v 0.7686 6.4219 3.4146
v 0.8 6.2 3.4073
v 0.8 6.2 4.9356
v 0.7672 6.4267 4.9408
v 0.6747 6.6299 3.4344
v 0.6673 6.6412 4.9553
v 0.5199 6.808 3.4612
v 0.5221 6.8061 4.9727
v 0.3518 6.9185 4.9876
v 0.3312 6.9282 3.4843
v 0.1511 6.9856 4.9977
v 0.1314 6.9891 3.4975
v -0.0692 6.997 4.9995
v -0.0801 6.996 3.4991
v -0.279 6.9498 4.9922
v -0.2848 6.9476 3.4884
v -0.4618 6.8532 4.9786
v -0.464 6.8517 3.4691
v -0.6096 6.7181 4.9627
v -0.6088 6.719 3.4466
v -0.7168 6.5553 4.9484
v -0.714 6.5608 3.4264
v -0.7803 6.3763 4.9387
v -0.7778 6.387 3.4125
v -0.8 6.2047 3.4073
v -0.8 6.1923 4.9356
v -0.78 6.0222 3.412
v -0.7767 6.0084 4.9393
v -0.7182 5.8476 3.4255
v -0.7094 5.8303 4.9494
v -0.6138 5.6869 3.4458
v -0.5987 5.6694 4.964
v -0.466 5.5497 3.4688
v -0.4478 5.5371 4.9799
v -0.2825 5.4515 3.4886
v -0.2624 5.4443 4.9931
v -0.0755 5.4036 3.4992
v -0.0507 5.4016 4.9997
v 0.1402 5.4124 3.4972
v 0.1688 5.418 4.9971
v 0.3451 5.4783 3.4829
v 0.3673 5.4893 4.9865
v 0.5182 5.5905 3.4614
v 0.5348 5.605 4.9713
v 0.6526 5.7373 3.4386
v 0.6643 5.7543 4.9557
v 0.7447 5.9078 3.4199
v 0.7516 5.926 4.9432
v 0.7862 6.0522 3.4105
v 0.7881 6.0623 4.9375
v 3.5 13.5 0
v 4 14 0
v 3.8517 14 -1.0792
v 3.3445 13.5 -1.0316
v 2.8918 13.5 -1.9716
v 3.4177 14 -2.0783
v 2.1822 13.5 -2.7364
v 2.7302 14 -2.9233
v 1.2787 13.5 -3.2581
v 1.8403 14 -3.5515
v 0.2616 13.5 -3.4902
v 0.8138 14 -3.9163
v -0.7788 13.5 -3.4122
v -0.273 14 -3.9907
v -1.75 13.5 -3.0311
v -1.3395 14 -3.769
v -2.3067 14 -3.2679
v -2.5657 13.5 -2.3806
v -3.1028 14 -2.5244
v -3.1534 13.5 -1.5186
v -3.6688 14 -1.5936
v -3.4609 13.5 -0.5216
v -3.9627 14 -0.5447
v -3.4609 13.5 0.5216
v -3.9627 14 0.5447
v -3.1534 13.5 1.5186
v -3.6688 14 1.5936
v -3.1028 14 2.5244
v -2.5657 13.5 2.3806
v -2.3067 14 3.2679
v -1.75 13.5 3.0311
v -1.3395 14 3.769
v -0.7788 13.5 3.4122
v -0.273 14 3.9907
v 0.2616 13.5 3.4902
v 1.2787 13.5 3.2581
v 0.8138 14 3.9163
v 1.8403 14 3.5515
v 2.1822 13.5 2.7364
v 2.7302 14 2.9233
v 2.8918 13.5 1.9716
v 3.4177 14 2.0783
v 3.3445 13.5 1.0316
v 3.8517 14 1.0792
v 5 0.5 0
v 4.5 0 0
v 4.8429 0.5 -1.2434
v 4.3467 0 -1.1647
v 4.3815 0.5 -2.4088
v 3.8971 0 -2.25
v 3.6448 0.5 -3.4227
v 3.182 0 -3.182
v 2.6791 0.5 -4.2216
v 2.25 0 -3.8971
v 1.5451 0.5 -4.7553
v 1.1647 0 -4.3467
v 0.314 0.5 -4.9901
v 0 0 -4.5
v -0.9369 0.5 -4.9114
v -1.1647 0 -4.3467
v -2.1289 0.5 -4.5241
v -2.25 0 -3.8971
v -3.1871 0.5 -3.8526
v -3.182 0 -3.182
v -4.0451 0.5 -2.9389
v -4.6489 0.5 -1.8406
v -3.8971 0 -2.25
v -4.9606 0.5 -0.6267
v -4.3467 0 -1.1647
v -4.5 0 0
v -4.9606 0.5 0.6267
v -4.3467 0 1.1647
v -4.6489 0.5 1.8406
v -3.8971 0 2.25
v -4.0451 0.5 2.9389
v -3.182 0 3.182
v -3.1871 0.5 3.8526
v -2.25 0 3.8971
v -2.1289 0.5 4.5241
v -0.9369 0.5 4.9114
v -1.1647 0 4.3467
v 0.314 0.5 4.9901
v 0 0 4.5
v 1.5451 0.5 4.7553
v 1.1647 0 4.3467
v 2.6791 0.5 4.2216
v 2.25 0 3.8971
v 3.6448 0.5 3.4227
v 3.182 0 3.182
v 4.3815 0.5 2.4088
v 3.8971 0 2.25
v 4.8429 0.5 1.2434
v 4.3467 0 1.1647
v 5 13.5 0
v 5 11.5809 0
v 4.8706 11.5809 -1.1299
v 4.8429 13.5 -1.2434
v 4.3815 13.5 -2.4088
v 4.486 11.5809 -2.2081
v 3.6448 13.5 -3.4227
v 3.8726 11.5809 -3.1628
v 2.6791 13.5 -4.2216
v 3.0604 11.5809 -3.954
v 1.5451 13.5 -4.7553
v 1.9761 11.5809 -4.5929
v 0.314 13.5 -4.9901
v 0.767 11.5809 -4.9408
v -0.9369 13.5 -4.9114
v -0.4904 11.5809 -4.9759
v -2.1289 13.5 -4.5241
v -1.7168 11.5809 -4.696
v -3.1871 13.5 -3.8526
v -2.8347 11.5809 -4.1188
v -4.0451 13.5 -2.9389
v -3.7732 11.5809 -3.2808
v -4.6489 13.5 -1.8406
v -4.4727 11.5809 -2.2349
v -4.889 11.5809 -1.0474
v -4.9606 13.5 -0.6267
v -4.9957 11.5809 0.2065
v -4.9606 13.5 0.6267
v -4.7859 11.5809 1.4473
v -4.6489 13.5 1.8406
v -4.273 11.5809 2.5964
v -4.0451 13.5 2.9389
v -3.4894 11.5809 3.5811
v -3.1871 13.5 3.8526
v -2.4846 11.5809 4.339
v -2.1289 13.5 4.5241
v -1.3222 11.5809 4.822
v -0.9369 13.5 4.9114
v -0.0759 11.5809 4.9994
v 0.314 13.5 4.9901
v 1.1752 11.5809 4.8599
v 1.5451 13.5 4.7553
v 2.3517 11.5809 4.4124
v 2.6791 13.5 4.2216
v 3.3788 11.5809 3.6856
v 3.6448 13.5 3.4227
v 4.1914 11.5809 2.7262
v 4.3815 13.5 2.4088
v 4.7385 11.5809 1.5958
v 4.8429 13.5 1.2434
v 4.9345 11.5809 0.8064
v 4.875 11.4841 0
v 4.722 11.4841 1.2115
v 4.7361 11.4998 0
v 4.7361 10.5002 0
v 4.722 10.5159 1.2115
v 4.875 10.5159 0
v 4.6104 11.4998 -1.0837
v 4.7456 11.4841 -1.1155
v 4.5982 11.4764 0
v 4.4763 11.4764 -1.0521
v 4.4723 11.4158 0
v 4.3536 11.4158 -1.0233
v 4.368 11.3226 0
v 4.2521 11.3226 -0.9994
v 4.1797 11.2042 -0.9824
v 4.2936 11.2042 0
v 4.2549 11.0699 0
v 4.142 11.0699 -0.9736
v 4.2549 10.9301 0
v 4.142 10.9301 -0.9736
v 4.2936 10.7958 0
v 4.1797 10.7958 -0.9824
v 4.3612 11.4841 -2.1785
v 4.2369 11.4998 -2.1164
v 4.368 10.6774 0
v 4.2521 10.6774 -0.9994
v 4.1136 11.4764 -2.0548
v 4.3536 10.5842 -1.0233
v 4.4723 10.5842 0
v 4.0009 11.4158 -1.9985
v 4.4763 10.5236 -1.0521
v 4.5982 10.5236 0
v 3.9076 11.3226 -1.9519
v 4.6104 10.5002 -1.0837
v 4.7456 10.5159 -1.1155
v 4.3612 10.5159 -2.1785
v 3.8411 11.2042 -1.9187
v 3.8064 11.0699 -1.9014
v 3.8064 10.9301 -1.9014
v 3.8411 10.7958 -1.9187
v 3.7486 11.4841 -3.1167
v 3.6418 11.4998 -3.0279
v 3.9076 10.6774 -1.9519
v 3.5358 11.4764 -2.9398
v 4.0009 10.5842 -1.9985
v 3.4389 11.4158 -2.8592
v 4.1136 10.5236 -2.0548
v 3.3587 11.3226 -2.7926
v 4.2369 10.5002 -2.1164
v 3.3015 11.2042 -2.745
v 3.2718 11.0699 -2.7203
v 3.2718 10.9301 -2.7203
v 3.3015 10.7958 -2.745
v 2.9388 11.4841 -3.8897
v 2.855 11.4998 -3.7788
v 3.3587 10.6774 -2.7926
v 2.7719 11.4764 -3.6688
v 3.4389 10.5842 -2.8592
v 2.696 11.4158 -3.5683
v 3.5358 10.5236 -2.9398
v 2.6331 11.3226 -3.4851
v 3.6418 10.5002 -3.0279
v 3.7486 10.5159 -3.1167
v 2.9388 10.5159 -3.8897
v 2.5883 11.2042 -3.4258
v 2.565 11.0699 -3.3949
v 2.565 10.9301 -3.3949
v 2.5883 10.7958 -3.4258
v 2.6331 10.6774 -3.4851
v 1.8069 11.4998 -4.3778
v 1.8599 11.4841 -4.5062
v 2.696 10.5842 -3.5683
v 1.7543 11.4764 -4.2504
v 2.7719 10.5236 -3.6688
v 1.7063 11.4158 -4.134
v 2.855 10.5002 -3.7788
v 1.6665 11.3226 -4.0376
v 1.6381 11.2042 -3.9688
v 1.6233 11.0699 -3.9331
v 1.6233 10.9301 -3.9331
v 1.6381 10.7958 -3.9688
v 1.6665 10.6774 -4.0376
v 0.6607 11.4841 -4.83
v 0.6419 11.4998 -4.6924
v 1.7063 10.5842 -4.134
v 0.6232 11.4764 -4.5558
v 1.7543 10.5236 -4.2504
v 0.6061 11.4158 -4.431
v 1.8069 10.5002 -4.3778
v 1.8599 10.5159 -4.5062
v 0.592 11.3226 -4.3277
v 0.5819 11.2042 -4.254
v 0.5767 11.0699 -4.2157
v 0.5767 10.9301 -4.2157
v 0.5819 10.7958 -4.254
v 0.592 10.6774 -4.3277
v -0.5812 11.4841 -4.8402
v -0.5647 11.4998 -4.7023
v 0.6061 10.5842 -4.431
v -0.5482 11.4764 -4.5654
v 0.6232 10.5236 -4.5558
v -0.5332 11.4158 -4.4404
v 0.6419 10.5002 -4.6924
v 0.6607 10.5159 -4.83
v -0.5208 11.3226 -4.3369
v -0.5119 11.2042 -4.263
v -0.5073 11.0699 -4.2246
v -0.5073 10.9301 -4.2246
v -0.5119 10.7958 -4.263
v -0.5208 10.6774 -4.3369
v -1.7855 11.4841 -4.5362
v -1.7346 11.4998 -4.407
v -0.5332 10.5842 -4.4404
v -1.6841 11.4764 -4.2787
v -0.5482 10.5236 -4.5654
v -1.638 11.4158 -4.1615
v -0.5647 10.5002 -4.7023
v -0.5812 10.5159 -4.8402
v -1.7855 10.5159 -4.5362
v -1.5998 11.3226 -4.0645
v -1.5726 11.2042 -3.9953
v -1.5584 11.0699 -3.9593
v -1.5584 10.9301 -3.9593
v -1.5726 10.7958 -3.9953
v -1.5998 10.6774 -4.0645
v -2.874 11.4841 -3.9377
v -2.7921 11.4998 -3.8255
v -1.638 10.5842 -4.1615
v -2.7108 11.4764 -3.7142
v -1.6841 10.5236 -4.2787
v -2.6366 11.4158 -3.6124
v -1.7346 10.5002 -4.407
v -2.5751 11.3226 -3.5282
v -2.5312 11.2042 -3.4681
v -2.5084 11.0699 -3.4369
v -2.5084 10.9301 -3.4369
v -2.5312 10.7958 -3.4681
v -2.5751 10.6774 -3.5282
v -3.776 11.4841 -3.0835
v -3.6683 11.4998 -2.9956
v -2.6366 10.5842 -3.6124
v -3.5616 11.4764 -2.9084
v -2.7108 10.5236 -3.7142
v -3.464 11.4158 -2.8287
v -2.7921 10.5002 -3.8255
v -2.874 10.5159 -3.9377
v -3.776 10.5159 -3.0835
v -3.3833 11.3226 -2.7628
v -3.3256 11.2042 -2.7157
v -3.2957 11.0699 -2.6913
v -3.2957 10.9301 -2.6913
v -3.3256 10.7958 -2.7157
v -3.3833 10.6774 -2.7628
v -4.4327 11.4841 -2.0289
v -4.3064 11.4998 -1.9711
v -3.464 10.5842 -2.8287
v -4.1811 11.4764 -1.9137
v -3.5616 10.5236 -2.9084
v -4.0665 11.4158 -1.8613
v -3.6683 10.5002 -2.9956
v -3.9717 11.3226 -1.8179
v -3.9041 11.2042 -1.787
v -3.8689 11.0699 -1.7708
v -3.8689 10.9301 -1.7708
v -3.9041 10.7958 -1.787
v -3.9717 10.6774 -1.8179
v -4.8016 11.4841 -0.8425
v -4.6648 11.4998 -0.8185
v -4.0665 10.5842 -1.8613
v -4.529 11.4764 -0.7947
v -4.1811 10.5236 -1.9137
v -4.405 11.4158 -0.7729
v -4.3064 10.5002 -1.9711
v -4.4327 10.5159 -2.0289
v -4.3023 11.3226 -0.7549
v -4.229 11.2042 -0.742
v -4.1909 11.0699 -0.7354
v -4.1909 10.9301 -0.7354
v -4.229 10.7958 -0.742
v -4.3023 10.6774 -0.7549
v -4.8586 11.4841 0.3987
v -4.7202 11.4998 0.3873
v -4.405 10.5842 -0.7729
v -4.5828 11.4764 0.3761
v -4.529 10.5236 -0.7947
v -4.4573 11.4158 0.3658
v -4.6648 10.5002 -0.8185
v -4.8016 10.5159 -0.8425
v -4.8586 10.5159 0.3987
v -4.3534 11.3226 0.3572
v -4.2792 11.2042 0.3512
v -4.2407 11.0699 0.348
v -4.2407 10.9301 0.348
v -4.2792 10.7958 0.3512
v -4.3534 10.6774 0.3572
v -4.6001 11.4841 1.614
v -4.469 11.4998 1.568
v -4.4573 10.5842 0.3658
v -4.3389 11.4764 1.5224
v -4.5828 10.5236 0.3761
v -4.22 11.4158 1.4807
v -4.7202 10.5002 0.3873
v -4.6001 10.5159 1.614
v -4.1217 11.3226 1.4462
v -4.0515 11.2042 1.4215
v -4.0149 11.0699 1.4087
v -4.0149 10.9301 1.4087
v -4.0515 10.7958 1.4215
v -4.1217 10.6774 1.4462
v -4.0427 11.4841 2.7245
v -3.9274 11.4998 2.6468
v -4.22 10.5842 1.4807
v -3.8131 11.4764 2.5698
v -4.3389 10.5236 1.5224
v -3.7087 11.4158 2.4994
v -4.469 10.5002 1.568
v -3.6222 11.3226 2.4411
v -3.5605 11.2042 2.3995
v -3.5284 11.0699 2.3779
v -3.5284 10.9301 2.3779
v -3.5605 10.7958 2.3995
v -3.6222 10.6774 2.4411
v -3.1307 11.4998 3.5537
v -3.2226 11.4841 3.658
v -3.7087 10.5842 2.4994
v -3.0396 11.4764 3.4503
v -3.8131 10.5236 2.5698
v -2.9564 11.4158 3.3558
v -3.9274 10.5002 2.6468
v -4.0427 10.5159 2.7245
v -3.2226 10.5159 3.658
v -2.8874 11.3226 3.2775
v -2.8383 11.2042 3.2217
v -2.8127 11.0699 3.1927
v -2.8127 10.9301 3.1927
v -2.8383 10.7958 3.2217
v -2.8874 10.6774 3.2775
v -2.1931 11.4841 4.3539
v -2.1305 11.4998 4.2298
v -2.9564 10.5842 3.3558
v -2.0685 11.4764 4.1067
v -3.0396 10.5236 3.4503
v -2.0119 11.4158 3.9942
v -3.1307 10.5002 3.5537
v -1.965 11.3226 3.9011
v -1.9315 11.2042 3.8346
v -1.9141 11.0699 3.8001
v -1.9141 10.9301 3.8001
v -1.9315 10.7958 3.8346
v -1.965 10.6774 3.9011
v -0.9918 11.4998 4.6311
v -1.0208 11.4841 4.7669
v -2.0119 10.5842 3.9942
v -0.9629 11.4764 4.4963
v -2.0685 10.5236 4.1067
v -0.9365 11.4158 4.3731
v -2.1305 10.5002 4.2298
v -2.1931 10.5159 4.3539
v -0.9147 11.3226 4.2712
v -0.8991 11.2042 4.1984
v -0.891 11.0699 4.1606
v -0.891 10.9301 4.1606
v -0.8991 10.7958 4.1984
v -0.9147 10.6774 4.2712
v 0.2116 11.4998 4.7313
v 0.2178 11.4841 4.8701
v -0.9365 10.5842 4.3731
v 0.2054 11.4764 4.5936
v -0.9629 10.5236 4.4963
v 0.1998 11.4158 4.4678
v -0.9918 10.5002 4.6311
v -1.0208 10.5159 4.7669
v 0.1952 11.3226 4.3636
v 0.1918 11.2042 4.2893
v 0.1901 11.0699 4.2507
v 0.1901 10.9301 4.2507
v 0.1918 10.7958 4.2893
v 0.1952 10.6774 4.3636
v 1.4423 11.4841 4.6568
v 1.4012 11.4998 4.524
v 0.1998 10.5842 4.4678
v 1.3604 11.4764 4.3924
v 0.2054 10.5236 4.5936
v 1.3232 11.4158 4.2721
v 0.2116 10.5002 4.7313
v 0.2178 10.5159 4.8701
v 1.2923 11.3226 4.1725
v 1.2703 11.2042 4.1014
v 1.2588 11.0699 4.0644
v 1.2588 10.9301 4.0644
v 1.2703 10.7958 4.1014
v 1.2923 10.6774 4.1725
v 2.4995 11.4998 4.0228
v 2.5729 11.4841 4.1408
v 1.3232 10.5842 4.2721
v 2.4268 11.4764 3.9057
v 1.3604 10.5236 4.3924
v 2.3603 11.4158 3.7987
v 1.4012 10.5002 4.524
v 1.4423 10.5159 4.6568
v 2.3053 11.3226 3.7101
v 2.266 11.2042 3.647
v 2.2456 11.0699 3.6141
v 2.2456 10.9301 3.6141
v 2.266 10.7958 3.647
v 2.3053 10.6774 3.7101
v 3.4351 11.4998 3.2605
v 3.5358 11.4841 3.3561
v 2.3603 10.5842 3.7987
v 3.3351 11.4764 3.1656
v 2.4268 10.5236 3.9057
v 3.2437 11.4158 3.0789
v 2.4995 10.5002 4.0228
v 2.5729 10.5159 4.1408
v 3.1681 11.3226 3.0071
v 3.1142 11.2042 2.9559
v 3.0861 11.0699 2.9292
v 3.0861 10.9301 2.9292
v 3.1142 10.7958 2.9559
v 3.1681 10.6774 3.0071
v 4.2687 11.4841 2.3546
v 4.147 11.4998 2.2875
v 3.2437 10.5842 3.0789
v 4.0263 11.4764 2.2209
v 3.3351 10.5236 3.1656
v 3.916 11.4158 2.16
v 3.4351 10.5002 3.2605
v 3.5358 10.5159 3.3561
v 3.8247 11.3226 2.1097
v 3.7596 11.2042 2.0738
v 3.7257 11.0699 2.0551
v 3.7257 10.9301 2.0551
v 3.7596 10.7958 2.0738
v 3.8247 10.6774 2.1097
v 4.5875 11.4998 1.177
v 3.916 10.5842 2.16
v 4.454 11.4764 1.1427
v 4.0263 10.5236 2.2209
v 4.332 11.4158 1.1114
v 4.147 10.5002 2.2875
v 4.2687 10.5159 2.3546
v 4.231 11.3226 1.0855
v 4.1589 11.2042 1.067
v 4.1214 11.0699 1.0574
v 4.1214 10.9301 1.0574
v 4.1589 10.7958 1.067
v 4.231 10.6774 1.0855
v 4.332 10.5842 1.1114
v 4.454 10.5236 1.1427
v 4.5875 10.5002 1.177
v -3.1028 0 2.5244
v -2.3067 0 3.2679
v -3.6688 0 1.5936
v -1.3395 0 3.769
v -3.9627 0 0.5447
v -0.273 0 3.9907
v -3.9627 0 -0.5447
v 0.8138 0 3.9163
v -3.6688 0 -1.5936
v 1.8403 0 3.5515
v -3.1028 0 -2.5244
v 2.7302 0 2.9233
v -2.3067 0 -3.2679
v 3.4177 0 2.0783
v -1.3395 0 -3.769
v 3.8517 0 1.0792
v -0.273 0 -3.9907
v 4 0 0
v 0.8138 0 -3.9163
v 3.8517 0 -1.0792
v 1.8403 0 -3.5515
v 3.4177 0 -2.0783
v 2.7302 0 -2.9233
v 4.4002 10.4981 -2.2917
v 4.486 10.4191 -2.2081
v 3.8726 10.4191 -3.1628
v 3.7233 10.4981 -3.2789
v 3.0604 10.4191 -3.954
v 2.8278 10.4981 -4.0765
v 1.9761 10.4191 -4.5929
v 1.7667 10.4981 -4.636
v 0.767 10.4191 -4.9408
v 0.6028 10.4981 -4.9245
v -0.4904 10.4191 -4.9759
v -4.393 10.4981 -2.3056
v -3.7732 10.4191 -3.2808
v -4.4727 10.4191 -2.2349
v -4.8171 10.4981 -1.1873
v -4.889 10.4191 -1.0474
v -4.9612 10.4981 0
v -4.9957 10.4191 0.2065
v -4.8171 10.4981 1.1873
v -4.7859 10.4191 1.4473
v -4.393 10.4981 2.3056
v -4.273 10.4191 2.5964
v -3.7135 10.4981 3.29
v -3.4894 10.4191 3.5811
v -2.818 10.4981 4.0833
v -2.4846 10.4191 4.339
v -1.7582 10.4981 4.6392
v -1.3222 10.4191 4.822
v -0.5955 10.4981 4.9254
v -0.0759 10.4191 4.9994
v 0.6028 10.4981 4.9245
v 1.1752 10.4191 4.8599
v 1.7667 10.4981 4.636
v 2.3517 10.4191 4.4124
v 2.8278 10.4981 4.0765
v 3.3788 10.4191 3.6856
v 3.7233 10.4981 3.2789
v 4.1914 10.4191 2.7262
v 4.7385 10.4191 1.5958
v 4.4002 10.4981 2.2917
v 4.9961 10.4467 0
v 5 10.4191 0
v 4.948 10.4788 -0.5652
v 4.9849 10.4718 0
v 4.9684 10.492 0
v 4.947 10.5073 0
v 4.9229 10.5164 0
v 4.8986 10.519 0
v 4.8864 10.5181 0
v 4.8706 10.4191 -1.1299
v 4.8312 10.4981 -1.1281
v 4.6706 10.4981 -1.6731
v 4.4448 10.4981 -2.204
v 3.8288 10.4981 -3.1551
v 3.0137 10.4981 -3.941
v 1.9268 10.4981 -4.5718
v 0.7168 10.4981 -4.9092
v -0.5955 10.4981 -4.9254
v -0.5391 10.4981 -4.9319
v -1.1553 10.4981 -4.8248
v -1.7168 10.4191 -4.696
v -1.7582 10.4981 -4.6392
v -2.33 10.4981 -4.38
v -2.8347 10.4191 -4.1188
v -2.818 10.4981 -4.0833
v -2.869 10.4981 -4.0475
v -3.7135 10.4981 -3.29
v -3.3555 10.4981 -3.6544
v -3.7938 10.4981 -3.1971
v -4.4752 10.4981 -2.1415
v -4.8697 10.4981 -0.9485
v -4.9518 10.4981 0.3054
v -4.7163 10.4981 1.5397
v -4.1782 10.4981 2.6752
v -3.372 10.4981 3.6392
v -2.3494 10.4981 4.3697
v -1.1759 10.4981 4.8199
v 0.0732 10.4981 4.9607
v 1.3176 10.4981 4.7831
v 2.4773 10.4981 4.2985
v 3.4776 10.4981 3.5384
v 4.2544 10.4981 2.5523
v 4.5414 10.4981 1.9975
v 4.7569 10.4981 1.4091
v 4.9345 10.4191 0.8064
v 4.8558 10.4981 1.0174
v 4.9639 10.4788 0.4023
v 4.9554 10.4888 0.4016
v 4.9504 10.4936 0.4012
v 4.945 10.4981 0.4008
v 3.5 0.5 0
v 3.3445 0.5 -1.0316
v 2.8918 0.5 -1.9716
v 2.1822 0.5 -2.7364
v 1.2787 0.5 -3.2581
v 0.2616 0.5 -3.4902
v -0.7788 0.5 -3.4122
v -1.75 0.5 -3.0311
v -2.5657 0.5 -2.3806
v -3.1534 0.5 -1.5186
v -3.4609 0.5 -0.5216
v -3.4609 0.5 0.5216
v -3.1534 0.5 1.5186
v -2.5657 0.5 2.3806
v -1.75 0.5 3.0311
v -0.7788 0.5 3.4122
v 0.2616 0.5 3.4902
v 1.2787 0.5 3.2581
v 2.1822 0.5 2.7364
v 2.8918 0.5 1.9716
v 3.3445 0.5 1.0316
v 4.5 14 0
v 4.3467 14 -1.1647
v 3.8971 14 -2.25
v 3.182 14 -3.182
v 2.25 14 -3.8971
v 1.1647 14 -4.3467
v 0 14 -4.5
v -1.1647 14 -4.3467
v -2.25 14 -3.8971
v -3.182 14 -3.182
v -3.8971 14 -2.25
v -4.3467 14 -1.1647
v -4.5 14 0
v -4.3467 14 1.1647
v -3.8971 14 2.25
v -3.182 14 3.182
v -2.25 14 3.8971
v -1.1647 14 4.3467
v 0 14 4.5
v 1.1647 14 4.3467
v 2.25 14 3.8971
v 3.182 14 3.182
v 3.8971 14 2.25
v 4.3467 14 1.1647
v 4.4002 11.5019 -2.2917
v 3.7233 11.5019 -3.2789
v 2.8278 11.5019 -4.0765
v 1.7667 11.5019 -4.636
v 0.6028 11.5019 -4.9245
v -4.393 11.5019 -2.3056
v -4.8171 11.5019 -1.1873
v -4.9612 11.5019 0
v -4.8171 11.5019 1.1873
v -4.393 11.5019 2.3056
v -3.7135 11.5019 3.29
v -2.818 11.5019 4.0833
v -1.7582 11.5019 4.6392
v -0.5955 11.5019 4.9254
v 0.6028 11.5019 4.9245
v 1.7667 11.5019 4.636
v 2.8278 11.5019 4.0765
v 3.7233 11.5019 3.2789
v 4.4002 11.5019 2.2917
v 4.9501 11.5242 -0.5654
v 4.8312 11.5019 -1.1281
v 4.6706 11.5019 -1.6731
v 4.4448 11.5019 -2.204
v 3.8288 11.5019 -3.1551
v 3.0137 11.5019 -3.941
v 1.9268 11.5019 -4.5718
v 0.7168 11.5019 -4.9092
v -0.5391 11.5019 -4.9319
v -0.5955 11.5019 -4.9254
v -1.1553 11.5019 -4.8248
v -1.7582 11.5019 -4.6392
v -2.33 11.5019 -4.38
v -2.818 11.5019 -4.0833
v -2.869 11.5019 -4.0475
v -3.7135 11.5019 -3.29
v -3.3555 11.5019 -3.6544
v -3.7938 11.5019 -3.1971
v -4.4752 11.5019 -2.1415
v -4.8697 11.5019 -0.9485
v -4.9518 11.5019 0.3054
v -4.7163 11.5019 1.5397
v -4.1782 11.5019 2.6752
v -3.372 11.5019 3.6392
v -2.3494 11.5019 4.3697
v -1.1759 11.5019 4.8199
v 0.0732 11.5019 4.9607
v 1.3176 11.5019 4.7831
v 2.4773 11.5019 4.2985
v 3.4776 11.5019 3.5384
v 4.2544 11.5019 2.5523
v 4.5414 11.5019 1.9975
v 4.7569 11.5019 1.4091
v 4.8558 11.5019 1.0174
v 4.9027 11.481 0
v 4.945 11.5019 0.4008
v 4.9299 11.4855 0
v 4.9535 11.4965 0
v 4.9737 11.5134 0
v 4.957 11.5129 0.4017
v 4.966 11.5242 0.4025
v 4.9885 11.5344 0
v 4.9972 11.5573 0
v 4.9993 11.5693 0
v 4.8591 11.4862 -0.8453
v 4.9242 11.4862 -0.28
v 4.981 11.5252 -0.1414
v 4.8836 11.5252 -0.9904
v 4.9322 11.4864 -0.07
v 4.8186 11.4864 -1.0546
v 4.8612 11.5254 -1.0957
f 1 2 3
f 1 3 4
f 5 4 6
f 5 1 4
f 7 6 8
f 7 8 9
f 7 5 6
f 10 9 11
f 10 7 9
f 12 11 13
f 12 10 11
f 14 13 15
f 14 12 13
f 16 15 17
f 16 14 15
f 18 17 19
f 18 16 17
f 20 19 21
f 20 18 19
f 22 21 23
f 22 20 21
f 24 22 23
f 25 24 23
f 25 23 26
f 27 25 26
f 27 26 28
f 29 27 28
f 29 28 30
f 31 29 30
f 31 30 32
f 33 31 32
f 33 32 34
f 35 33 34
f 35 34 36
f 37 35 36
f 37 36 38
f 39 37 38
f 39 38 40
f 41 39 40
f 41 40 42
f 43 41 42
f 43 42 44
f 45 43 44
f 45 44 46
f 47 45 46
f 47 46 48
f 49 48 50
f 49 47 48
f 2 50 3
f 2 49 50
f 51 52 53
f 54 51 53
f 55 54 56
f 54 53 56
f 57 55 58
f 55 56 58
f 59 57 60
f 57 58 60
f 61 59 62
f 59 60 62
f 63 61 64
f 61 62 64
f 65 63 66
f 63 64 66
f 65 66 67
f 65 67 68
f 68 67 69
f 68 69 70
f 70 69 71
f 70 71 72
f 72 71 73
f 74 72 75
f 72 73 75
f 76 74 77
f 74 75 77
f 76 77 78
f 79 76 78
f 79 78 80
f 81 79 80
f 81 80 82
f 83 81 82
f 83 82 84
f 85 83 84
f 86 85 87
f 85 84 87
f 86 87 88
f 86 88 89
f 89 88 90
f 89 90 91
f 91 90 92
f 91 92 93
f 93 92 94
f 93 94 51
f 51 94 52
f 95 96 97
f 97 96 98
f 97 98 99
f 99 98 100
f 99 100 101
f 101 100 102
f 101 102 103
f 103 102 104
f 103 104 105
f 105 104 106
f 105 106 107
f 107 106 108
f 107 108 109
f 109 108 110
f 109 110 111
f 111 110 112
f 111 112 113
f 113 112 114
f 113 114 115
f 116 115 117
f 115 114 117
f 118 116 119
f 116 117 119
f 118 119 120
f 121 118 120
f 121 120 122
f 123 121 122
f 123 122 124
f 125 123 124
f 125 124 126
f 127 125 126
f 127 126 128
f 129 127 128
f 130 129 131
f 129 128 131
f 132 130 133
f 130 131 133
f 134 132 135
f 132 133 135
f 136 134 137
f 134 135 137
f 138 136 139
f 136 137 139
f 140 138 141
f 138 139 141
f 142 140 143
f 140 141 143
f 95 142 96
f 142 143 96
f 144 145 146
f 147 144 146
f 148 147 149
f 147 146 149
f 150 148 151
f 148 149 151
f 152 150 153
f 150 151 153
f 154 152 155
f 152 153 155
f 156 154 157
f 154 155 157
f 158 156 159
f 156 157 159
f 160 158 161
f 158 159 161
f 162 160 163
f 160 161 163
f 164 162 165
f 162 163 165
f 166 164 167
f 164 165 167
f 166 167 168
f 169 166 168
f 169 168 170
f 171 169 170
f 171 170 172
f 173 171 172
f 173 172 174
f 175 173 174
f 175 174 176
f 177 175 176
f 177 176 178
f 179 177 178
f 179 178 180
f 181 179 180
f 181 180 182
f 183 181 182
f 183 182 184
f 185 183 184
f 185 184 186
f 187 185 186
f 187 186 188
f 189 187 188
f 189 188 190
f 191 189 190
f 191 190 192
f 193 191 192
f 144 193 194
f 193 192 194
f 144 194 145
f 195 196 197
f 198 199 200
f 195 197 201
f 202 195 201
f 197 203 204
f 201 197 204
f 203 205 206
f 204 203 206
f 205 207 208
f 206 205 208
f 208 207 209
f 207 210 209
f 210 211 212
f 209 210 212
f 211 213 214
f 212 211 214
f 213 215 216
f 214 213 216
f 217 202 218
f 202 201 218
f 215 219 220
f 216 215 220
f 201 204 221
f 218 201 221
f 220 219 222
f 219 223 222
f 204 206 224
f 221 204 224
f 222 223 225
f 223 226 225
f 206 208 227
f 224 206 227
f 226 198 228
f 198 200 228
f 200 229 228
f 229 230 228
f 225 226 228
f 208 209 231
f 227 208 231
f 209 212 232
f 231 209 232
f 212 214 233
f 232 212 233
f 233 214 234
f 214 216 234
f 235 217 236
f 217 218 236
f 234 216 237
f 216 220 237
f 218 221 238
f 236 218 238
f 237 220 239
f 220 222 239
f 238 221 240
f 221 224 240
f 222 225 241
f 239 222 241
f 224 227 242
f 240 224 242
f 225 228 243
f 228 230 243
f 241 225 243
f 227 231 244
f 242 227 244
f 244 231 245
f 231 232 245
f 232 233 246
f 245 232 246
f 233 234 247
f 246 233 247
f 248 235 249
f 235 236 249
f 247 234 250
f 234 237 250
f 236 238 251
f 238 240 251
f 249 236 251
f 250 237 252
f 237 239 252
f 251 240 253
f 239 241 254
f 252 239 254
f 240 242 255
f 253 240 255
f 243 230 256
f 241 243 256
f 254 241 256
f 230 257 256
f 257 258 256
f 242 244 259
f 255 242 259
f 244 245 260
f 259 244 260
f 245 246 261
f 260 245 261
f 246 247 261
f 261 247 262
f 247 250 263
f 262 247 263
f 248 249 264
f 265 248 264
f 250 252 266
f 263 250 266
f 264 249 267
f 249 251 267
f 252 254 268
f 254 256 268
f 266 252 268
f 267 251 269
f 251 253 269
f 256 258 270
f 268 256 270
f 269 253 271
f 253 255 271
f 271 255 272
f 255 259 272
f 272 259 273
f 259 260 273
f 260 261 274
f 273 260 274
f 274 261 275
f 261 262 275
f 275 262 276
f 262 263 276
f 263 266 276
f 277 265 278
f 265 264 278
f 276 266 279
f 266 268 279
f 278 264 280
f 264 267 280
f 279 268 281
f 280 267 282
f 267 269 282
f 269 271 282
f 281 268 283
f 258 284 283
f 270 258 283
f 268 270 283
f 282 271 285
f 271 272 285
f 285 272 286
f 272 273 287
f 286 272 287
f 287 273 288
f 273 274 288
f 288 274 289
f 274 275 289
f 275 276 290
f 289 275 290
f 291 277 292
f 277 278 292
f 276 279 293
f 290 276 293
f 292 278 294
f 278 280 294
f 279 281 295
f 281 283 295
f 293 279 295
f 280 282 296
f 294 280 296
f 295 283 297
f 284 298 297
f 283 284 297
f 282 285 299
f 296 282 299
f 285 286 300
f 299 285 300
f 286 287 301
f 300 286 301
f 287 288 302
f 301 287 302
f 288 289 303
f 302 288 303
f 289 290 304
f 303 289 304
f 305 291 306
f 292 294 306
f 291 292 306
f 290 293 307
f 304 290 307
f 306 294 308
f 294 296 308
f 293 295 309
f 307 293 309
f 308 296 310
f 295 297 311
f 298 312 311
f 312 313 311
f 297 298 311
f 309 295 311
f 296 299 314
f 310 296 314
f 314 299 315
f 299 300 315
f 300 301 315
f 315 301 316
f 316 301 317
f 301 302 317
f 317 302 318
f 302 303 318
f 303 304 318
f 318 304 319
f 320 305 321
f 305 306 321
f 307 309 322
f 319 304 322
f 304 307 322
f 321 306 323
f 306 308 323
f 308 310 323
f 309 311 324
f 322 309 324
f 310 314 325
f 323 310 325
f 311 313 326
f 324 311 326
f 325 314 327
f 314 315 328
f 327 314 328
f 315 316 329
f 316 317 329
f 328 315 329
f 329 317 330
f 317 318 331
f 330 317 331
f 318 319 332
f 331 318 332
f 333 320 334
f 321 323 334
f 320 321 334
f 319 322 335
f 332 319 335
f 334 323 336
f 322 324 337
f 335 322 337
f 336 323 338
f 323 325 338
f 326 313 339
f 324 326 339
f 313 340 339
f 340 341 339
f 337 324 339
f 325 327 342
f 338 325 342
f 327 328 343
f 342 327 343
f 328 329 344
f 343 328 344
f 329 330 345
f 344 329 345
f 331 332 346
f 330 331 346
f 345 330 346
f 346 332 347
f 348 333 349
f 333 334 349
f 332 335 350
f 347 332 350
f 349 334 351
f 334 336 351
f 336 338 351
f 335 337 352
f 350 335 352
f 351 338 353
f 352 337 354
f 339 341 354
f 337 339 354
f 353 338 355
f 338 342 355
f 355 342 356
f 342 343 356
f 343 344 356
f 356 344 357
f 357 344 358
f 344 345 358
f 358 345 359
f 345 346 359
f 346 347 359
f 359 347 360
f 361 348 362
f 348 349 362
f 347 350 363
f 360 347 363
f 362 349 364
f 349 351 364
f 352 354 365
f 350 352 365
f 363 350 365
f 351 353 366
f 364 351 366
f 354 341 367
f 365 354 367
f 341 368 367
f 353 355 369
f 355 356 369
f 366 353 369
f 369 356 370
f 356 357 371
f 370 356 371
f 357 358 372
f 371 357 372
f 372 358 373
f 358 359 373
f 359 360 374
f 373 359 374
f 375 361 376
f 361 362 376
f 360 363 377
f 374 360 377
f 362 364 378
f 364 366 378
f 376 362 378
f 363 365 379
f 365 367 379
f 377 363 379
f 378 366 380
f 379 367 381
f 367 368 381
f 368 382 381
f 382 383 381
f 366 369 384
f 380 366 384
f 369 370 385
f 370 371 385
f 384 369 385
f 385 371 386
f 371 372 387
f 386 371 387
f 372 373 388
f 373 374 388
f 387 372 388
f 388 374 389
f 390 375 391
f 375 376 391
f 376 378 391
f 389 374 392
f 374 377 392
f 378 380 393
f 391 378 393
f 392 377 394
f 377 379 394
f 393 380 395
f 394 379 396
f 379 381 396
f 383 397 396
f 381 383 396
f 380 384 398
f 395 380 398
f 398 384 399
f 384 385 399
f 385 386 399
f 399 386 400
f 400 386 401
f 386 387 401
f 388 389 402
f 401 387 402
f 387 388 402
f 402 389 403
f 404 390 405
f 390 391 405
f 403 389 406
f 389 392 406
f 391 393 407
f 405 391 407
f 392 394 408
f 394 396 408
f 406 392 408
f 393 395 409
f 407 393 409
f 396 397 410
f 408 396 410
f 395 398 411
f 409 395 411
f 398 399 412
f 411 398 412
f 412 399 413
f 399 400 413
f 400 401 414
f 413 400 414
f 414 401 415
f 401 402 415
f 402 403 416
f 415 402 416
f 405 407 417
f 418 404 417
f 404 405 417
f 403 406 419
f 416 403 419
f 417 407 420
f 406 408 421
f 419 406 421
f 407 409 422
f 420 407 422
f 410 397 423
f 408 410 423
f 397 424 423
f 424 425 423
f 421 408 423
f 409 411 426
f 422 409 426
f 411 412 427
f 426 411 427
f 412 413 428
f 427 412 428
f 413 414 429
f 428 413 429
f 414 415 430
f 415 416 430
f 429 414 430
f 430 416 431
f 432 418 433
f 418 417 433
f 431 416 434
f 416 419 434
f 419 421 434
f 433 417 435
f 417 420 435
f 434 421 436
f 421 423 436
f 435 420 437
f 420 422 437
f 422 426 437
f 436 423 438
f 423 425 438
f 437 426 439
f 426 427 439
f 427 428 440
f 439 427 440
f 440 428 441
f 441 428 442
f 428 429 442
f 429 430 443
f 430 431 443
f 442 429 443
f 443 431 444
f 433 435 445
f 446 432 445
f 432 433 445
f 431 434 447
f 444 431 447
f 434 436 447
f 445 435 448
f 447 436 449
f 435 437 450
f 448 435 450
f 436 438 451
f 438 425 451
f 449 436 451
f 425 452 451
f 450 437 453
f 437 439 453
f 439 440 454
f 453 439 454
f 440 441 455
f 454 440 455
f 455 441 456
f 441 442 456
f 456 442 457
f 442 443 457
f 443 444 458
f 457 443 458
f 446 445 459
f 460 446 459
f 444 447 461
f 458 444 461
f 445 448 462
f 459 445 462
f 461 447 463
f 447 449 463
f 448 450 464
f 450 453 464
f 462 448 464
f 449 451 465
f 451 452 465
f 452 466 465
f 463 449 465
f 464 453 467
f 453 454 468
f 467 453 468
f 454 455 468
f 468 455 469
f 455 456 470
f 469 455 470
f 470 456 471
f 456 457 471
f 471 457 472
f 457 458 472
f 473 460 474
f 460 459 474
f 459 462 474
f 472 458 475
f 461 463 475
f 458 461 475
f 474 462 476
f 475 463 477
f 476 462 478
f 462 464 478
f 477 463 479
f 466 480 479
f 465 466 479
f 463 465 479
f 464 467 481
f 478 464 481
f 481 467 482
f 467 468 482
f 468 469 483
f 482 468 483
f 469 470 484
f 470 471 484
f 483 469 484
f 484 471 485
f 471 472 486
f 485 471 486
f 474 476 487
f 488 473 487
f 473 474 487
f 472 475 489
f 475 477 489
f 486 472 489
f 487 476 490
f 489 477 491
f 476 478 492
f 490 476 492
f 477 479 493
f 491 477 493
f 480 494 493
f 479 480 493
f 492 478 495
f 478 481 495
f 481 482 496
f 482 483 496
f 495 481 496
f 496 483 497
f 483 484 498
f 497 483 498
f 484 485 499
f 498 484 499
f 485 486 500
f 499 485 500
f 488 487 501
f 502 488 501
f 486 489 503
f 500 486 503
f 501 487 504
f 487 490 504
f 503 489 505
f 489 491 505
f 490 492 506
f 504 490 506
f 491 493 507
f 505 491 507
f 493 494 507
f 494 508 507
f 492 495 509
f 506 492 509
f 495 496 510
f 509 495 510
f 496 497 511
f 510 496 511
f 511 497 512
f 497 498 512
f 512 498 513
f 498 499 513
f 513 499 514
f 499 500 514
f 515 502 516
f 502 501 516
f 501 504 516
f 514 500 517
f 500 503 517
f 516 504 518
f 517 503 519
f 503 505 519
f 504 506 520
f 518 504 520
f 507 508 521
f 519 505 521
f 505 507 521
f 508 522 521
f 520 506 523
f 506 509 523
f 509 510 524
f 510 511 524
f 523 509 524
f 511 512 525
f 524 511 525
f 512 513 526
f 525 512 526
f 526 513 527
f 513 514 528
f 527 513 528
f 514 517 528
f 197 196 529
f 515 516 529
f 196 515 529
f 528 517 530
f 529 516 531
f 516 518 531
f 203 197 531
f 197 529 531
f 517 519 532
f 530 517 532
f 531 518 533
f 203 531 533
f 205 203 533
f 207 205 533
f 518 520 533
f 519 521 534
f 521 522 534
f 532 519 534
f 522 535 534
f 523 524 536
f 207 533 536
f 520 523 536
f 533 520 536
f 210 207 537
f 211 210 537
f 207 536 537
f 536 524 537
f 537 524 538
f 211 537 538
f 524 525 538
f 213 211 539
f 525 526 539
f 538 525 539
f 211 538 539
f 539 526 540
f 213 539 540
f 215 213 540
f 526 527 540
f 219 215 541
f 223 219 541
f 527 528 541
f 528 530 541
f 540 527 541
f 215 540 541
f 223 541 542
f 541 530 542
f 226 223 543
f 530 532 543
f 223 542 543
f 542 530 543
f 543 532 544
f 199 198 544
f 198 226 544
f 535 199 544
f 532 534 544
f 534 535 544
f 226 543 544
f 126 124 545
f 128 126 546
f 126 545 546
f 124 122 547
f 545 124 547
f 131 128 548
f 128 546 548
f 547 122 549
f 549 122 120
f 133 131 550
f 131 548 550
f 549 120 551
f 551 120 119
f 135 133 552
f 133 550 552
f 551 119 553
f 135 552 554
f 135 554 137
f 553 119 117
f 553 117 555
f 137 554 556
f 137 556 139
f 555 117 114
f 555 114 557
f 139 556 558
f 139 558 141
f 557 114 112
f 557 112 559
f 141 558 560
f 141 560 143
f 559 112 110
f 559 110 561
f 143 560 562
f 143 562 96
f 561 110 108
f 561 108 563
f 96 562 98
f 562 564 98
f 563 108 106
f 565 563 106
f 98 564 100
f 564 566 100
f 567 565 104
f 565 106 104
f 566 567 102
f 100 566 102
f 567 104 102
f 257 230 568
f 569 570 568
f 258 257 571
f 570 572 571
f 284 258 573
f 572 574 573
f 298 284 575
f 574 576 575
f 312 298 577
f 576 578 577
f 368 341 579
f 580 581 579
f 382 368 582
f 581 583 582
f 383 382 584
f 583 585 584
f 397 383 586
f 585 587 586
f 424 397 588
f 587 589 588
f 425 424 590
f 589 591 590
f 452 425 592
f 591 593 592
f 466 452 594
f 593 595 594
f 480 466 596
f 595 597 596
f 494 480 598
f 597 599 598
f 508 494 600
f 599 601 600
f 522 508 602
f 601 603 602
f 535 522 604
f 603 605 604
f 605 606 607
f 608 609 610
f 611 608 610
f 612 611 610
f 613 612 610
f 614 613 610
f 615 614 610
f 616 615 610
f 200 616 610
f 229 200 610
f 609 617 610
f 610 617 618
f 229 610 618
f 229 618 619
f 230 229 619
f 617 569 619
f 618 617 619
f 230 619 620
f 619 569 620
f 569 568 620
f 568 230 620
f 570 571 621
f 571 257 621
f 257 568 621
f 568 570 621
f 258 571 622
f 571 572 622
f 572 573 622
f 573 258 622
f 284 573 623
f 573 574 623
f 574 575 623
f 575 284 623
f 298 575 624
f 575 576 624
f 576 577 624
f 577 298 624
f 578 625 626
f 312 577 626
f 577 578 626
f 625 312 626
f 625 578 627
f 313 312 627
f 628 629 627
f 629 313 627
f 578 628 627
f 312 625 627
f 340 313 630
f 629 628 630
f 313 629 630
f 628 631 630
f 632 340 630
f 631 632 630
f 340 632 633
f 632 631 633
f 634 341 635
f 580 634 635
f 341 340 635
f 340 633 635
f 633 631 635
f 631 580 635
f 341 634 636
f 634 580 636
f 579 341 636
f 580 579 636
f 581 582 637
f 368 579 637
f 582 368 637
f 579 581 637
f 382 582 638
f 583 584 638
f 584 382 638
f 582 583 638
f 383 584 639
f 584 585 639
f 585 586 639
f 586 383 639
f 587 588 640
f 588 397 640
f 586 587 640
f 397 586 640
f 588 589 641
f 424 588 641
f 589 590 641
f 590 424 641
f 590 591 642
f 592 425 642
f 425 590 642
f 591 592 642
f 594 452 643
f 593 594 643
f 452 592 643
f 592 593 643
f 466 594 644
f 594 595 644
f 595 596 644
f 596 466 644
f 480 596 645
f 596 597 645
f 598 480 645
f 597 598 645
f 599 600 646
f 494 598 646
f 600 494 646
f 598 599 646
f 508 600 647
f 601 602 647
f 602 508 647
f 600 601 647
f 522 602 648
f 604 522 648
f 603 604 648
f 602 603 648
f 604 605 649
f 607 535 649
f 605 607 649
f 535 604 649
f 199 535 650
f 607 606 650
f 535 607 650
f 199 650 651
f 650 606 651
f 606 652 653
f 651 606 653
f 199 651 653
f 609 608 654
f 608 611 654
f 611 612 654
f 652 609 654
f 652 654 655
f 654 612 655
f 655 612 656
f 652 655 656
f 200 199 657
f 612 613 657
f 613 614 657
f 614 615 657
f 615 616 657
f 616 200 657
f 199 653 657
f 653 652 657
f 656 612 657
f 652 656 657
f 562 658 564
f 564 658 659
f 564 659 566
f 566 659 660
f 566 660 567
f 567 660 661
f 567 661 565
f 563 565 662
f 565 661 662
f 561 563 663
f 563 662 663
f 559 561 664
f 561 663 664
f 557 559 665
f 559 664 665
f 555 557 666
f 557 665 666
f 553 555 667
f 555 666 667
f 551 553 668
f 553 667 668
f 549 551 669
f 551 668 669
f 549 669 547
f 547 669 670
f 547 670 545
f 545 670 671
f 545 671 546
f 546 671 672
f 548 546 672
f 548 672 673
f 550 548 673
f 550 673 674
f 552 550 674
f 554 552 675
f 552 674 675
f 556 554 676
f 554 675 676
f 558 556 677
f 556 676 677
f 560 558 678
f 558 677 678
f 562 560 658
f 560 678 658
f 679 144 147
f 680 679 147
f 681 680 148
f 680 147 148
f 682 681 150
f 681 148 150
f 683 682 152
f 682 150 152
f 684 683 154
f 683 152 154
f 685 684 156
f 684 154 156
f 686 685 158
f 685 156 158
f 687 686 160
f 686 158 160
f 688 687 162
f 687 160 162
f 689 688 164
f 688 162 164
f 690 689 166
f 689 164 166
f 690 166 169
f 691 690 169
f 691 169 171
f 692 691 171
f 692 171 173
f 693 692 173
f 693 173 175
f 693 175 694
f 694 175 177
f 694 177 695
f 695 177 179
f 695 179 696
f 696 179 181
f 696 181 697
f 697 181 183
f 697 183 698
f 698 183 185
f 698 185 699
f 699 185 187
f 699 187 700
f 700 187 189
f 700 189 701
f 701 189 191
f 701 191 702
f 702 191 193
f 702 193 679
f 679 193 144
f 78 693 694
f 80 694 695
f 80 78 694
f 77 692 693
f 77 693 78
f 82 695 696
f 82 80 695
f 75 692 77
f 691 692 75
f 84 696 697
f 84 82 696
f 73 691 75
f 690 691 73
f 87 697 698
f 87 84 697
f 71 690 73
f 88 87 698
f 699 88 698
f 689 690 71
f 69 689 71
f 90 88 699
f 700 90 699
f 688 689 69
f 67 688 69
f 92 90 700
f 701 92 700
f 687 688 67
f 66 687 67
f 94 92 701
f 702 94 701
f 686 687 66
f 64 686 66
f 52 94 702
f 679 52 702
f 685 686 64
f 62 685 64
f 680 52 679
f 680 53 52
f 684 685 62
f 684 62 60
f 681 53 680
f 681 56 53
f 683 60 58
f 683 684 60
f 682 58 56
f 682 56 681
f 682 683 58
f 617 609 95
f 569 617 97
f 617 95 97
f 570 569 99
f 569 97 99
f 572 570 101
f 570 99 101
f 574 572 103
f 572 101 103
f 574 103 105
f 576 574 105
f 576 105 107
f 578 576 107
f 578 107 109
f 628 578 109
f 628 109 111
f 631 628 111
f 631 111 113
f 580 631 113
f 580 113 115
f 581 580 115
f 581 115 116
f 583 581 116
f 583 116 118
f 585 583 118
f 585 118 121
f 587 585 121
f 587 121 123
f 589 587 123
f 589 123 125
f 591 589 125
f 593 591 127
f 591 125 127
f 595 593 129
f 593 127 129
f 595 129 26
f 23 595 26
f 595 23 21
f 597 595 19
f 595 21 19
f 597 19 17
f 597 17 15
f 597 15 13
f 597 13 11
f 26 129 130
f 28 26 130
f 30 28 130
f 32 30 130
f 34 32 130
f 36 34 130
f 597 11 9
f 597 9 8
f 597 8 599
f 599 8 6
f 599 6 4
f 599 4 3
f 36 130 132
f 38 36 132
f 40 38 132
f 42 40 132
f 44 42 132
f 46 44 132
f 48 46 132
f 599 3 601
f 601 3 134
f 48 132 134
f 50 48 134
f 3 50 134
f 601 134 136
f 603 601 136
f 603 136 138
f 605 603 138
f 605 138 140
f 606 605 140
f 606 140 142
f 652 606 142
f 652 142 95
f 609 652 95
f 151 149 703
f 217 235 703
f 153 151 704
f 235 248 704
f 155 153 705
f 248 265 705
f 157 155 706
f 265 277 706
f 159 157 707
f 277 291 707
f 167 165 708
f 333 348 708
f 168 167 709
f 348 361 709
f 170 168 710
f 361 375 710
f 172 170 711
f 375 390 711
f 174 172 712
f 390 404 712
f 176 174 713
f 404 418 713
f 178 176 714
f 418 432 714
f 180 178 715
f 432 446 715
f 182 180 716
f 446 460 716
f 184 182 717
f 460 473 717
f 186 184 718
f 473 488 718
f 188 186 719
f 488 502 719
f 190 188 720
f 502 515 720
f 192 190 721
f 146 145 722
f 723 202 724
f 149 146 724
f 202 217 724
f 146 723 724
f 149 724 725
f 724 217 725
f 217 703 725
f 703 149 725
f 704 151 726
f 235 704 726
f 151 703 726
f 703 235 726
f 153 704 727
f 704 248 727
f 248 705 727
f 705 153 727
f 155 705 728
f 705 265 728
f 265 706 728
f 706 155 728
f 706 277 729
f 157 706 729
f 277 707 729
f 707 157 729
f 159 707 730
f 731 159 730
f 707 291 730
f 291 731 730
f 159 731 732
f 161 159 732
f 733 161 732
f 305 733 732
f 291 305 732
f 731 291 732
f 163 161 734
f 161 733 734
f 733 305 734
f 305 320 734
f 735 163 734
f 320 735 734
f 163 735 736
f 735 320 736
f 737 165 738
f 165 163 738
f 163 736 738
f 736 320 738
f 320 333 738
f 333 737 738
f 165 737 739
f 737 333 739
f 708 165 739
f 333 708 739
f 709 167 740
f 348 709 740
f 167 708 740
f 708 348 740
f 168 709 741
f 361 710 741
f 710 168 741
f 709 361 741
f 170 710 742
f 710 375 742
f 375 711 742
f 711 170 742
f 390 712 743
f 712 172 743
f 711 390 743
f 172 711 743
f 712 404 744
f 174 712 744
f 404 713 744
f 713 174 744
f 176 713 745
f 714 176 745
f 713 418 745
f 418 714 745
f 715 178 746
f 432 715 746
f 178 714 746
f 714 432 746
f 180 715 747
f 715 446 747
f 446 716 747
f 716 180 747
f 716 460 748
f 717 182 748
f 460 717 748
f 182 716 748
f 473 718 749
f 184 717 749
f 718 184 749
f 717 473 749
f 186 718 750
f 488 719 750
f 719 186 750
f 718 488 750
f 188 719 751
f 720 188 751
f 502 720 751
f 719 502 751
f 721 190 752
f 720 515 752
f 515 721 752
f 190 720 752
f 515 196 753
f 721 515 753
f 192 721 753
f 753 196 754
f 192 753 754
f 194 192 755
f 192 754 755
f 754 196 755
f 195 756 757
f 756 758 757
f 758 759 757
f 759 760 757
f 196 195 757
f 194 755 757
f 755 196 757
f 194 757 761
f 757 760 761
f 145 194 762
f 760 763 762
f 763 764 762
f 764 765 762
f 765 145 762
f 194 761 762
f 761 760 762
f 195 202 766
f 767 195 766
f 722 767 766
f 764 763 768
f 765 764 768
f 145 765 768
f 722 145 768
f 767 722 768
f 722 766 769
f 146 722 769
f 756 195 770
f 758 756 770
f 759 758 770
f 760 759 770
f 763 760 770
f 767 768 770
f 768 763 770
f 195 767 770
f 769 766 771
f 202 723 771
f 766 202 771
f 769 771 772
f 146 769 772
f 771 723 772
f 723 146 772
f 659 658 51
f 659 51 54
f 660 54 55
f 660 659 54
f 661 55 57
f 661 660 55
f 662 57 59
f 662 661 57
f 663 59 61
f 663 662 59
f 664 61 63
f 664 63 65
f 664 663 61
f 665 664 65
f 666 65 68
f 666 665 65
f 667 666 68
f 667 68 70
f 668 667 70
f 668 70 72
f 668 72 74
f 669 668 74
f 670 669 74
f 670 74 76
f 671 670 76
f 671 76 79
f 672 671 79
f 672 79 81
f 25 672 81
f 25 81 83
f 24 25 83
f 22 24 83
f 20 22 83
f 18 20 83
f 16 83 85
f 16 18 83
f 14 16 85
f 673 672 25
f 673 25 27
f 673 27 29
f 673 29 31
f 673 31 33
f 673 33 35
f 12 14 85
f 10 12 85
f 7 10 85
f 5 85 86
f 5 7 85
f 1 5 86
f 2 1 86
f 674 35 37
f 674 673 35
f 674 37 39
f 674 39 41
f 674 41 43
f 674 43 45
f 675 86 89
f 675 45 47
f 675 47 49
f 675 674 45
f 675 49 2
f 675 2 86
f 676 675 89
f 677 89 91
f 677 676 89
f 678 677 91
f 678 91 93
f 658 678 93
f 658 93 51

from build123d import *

# Parameters (mm, degrees)
SKETCH1_R           = 5
SKETCH1_R_2         = 3.5
BOSS_EXTRUDE1_DEPTH = 14
SKETCH3_R           = 0.8
CUT_EXTRUDE1_DEPTH  = 6
SKETCH4_R           = 0.5
FILLET1_R           = 0.1
CHAMFER1_SIZE       = 0.5


with BuildPart() as part:
    # Sketch1 → Boss-Extrude1 (new body)
    with BuildSketch(Plane(origin=(0, 0, 0), x_dir=(1, 0, 0), z_dir=(0, 1, 0))):
        Circle(SKETCH1_R)
        Circle(SKETCH1_R_2, mode=Mode.SUBTRACT)
    extrude(amount=BOSS_EXTRUDE1_DEPTH)

    # Sketch3 → Cut-Extrude1 (cut, through all)
    with BuildSketch(Plane.XY):
        with Locations((0, 6.2)):
            Circle(SKETCH3_R)
    extrude(amount=CUT_EXTRUDE1_DEPTH, mode=Mode.SUBTRACT)

    # Sketch4 → Cut-Revolve1 (revolve, cut)
    with BuildSketch(Plane.XY):
        with Locations((4.75, 11)):
            Circle(SKETCH4_R)
    revolve(axis=Axis((0, 0, 0), (0, 1, 0)), mode=Mode.SUBTRACT)

    # Fillet1
    fillet1_edges = [part.edges().sort_by_distance(p)[0] for p in [
        (-5, 11.433012702, 0),
        (-5, 10.566987298, 0),
    ]]
    fillet(fillet1_edges, radius=FILLET1_R)

    # Chamfer1
    chamfer1_edges = [part.edges().sort_by_distance(p)[0] for p in [
        (-5, 0, 0),
        (-5, 14, 0),
        (-3.5, 0, 0),
        (-3.5, 14, 0),
    ]]
    chamfer(chamfer1_edges, length=CHAMFER1_SIZE)


solid = part.part
